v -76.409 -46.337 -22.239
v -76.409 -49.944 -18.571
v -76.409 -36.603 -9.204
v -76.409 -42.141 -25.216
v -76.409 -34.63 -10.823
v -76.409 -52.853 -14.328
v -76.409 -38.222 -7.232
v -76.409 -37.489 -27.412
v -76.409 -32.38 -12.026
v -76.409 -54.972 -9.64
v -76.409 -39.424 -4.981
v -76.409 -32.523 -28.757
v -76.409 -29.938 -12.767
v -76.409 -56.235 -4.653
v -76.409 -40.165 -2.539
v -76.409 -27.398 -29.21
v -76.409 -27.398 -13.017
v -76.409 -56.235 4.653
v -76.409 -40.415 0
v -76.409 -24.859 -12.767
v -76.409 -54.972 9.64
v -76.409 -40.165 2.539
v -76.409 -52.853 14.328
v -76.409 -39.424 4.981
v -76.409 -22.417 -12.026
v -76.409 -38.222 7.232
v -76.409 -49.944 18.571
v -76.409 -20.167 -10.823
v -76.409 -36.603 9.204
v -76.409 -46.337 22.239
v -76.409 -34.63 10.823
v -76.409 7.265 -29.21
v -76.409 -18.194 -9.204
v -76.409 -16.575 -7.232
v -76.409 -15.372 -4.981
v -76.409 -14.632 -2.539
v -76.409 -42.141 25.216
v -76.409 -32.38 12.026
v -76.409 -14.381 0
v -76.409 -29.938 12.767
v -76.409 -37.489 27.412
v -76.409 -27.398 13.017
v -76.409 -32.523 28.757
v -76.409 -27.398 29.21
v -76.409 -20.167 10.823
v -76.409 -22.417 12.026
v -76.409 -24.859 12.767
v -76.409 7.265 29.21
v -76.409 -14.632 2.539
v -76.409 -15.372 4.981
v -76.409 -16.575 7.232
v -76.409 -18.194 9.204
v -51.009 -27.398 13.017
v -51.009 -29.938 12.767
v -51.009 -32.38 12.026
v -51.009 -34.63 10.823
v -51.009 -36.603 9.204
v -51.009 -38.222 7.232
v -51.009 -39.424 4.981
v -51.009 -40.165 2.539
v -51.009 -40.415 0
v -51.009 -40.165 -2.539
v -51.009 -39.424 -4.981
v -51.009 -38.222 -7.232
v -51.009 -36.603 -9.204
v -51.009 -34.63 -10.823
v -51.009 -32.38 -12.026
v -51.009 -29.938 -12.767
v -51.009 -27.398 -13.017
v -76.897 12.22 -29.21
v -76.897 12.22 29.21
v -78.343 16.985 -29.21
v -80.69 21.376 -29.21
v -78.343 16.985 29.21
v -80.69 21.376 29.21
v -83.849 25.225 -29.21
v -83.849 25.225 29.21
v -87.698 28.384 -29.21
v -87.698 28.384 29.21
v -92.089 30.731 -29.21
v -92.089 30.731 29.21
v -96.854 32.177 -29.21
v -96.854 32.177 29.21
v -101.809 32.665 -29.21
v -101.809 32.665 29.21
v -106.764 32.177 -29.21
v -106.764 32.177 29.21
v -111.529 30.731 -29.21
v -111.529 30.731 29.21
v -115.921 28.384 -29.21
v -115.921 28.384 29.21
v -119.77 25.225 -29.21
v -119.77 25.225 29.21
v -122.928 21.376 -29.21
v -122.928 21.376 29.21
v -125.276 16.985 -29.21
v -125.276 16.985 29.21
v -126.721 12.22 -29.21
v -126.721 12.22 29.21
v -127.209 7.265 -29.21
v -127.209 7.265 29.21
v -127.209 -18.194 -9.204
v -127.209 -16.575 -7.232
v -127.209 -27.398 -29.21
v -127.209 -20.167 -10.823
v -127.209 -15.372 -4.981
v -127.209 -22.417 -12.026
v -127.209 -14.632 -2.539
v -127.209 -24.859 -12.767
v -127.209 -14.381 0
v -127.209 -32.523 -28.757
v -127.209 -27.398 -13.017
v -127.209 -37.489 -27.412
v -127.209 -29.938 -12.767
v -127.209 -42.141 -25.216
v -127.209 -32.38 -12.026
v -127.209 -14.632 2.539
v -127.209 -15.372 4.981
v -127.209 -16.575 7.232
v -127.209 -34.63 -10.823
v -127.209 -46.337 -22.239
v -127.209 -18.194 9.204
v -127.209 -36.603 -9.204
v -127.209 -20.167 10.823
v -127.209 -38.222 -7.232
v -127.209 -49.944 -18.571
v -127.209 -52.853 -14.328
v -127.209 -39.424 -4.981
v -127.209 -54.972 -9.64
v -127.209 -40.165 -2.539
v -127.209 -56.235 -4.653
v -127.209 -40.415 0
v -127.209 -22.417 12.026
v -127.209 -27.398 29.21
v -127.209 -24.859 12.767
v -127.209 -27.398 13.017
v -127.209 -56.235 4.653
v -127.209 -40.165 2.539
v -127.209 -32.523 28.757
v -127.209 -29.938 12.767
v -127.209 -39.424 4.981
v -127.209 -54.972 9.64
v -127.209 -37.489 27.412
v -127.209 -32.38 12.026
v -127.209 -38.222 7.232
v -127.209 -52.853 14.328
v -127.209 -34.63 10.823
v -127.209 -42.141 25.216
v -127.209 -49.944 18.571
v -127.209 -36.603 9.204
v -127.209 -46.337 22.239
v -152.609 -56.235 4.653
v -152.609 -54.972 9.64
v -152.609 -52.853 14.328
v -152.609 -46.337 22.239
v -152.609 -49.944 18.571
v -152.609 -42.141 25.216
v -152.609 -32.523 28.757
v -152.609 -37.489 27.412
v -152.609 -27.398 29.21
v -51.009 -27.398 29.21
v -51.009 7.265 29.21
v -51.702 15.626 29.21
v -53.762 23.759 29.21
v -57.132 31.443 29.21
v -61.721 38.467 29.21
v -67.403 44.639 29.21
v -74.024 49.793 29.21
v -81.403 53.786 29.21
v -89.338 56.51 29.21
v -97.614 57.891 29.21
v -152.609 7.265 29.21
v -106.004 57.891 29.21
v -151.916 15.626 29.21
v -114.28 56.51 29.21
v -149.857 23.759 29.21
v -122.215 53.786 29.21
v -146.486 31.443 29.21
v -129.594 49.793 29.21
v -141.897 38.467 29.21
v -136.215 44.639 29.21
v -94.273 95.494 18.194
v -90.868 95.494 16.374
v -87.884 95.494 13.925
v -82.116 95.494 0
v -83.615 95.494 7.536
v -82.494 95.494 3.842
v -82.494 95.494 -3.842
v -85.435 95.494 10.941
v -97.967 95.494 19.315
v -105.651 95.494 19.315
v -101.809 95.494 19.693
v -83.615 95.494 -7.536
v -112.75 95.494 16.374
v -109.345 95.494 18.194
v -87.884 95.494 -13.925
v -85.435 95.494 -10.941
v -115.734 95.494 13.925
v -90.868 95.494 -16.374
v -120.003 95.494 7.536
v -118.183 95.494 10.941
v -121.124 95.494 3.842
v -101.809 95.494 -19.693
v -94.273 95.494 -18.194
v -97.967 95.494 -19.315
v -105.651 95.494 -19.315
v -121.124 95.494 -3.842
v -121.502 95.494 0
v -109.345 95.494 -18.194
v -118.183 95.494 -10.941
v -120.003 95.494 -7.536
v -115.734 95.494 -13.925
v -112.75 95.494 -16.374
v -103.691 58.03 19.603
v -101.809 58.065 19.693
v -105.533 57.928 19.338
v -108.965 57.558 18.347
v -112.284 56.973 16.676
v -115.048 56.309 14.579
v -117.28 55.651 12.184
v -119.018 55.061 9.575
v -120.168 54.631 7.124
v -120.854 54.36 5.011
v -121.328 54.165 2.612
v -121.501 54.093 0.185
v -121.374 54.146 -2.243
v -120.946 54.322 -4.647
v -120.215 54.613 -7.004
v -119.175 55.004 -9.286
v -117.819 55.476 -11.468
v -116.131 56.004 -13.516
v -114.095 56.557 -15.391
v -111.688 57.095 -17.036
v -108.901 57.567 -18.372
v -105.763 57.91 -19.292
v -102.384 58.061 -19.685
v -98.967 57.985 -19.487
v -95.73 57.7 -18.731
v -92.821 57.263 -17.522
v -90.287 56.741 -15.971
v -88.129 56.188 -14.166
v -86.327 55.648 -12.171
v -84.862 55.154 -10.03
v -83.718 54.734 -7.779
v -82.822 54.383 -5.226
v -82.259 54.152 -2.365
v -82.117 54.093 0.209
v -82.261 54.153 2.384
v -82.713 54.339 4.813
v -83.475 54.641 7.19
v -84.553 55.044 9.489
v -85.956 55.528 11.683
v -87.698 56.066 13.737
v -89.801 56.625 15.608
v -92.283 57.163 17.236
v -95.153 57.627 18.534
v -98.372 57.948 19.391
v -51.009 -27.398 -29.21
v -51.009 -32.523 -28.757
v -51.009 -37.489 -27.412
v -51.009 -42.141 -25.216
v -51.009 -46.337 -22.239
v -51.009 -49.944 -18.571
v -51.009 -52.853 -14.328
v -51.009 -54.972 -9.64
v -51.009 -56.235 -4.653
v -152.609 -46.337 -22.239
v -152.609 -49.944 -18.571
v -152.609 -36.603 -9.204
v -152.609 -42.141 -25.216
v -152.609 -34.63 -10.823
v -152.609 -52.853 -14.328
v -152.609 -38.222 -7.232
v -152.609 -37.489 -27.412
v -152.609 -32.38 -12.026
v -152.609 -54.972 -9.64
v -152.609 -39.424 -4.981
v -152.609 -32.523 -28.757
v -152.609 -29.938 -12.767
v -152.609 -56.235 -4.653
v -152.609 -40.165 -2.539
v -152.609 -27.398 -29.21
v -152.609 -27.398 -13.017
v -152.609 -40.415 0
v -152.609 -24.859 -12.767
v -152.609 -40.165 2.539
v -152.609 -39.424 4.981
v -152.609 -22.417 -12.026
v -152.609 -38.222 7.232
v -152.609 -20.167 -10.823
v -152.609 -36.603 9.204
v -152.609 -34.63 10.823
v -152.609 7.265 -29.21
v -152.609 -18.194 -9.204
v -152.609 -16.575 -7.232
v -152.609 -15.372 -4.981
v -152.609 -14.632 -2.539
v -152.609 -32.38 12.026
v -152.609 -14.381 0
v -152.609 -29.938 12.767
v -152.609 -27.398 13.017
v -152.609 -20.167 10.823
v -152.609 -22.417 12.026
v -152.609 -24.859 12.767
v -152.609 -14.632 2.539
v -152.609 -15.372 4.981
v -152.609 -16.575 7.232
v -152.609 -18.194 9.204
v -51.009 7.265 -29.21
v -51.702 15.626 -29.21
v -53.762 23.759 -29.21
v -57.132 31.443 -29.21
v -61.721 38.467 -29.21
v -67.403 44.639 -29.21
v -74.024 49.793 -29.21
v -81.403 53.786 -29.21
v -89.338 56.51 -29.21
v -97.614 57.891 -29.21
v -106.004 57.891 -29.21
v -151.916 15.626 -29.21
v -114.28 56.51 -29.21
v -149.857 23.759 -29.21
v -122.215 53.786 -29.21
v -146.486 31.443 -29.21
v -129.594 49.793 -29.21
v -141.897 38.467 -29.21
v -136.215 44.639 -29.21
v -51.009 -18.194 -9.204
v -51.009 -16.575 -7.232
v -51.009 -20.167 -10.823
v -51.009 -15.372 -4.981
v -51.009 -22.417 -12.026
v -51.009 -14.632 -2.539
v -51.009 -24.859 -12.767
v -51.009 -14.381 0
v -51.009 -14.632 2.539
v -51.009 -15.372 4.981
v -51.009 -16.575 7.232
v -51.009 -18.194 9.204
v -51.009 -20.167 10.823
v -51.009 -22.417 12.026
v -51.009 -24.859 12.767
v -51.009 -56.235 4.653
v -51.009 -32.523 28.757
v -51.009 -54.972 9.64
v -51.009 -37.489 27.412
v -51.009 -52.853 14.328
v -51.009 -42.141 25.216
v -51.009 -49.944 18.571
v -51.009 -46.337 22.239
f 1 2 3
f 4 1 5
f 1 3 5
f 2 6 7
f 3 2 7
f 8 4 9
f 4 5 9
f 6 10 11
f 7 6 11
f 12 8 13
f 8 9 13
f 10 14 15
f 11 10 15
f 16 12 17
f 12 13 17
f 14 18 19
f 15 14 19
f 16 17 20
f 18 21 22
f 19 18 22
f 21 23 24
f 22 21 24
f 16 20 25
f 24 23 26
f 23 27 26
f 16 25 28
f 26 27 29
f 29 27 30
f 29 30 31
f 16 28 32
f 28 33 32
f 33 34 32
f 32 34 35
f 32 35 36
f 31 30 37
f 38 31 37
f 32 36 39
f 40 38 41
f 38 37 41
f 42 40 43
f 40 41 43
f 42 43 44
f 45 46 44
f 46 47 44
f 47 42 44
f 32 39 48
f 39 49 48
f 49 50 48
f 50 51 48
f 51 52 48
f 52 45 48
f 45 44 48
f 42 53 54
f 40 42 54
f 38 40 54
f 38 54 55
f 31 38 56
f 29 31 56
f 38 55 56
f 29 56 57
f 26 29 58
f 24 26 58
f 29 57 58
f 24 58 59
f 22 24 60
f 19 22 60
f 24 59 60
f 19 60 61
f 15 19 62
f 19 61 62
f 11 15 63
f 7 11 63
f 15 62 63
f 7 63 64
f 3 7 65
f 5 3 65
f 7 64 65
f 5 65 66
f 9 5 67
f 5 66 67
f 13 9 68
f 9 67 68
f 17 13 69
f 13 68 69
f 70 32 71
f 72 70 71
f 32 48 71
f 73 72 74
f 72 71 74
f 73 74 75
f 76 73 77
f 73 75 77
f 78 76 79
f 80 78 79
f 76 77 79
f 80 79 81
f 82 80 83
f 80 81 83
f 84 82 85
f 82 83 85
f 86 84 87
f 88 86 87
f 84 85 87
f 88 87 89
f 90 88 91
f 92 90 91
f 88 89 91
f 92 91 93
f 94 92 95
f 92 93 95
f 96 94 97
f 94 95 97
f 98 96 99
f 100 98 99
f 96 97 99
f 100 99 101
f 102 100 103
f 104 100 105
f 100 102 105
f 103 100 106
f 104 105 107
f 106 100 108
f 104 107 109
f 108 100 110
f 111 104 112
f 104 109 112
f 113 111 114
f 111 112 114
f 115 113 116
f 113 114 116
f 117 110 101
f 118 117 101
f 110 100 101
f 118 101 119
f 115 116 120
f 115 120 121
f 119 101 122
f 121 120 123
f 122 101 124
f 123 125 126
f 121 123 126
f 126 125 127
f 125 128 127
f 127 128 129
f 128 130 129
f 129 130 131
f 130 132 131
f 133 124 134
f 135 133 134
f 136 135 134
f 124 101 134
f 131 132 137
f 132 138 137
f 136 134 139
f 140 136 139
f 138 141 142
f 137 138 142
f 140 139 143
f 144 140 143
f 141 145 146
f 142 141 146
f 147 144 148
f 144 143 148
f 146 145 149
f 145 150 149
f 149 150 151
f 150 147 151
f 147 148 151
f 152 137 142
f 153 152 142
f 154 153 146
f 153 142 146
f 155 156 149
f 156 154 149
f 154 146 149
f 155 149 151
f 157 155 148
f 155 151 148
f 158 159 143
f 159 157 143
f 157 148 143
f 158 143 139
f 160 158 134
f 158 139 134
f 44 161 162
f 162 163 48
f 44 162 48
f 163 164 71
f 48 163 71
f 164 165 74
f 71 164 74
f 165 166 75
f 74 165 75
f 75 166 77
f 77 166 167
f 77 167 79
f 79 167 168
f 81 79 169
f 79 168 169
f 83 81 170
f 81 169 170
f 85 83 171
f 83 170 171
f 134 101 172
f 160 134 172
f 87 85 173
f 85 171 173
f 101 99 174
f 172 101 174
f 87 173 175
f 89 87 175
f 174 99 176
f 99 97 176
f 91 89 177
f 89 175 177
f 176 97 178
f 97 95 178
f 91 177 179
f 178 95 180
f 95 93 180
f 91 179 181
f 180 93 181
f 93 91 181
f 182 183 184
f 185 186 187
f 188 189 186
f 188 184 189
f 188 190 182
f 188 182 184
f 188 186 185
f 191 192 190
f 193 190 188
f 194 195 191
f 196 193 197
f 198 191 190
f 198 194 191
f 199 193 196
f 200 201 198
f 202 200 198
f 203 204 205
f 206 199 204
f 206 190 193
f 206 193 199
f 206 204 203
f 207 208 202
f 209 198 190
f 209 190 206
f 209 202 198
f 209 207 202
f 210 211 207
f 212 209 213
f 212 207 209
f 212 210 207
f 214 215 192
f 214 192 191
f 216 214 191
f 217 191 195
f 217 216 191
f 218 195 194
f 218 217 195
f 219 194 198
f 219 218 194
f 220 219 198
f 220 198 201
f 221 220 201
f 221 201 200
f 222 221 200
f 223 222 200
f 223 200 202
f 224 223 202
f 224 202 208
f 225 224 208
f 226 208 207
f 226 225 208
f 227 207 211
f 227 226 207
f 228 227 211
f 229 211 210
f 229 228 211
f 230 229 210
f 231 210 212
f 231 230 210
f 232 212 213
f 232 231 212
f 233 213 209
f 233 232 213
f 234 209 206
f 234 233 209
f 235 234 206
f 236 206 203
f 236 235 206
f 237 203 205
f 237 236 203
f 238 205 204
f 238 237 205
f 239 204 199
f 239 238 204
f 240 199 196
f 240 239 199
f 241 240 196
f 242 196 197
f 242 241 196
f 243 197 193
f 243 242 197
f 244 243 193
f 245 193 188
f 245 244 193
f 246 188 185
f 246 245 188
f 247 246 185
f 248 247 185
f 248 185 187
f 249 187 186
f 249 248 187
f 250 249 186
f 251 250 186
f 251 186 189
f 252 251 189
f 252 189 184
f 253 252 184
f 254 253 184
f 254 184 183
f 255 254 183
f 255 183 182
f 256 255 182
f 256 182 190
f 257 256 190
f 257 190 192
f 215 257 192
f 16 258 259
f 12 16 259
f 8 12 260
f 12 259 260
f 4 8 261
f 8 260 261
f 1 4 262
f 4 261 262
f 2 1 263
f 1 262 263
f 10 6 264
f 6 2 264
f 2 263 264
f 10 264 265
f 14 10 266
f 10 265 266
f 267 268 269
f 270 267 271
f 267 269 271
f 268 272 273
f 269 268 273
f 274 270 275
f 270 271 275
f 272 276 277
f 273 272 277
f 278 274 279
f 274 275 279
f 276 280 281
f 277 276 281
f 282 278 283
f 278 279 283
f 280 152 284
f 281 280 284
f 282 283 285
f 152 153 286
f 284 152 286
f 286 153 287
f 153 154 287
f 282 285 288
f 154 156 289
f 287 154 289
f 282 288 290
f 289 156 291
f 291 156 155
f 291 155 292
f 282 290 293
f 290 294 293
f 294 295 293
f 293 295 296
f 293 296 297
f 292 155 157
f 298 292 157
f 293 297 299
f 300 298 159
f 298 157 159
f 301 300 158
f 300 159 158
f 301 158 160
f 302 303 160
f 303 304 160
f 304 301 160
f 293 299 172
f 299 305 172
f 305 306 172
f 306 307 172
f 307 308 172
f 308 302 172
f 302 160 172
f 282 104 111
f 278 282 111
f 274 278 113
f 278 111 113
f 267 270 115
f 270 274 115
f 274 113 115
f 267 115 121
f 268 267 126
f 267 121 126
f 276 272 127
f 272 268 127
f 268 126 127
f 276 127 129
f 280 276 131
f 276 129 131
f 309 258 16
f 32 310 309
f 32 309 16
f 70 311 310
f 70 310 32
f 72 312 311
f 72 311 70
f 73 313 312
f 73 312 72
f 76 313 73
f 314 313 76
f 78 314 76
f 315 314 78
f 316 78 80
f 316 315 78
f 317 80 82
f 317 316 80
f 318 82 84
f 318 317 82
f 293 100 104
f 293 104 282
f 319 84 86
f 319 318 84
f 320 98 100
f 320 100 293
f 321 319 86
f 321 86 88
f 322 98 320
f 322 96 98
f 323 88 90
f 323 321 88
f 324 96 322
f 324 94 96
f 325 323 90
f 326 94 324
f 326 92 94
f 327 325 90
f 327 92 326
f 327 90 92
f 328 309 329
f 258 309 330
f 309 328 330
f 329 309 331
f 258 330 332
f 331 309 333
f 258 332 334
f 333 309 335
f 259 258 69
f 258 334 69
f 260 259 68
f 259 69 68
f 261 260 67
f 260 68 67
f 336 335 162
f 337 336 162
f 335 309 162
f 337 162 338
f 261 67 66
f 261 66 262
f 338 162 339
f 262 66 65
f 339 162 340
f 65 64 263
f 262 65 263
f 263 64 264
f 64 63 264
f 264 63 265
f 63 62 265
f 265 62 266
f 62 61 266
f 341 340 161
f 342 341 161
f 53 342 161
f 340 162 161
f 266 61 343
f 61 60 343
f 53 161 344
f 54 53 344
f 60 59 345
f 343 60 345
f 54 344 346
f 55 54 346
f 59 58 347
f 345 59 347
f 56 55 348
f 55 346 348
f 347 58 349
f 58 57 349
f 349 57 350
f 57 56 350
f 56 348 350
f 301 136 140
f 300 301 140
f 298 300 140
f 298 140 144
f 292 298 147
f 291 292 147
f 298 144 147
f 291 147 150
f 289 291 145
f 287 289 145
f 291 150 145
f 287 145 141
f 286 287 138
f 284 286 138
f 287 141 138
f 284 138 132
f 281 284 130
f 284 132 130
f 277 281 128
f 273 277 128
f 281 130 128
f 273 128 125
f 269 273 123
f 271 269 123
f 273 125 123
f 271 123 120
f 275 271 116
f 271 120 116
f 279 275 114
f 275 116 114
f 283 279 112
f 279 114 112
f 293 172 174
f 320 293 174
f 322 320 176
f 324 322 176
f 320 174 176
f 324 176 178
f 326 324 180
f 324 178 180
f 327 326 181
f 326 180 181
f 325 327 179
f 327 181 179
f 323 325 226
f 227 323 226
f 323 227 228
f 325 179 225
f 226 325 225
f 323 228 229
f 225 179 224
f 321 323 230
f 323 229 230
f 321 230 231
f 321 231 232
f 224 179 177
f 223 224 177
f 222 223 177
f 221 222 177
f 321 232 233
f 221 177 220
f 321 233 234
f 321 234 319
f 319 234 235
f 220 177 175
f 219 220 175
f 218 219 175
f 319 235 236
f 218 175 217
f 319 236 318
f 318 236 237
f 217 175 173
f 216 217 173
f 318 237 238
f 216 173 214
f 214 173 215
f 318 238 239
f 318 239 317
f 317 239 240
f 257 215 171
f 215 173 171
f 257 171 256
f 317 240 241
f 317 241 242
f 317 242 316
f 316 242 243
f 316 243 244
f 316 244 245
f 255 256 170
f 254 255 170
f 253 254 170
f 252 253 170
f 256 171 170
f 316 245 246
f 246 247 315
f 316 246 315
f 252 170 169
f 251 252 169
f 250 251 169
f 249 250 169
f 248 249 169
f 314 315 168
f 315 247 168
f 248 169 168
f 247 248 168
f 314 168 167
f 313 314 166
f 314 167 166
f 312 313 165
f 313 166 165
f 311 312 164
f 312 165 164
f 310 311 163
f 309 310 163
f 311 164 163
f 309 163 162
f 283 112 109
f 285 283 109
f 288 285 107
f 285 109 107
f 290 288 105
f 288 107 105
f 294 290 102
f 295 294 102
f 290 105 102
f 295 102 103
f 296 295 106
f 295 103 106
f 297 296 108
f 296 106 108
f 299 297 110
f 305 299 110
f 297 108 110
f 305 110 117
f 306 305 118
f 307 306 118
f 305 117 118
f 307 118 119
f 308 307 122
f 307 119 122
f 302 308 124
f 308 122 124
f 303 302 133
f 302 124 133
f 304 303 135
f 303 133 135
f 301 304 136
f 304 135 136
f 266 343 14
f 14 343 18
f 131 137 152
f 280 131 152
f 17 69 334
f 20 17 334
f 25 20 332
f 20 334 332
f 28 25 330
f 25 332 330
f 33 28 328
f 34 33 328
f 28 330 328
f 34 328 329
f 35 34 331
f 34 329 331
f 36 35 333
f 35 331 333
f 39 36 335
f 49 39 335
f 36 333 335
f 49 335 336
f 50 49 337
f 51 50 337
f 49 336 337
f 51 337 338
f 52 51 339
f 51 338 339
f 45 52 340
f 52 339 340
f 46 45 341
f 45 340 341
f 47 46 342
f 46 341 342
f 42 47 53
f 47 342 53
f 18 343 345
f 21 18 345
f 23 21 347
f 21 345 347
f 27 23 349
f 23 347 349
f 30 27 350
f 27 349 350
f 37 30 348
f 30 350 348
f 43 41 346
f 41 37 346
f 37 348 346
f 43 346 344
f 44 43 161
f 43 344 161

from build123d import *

# Parameters (mm, degrees)
BOSS_EXTRUDE1_DEPTH = 29.21
CUT_EXTRUDE1_DEPTH  = 143.460247374


with BuildPart() as part:
    # Sketch1 → Boss-Extrude1 (new, symmetric)
    with BuildSketch(Plane.XY):
        with BuildLine():
            ThreePointArc((-152.609053498, 7.264609053), (-101.809053498, 58.064609053), (-51.009053498, 7.264609053))
            Line((-51.009053498, 7.264609053), (-51.009053498, -56.235390947))
            Line((-51.009053498, -56.235390947), (-76.409053498, -56.235390947))
            Line((-76.409053498, -56.235390947), (-76.409053498, 7.264609053))
            ThreePointArc((-76.409053498, 7.264609053), (-101.809053498, 32.664609053), (-127.209053498, 7.264609053))
            Line((-127.209053498, 7.264609053), (-127.209053498, -56.235390947))
            Line((-127.209053498, -56.235390947), (-152.609053498, -56.235390947))
            Line((-152.609053498, -56.235390947), (-152.609053498, 7.264609053))
        make_face()
    extrude(amount=BOSS_EXTRUDE1_DEPTH, both=True)

    # Sketch1<4> → Revolve1 (revolve)
    with BuildSketch(Plane.XY, mode=Mode.PRIVATE) as revolve1_sk:
        with BuildLine():
            Line((-121.502148415, 95.494177501), (-121.502148415, 54.092186533))
            ThreePointArc((-121.502148415, 54.092186533), (-111.853929407, 57.061601613), (-101.809053498, 58.064609053))
            Line((-101.809053498, 58.064609053), (-101.809053498, 95.494177501))
            Line((-101.809053498, 95.494177501), (-121.502148415, 95.494177501))
        make_face()
    revolve(revolve1_sk.sketch.rotate(Axis((-101.809053498, 95.494177501, 0), (0, -1, 0)), 270), axis=Axis((-101.809053498, 95.494177501, 0), (0, -1, 0)))

    # Sketch3 → Cut-Extrude1 (cut, through all)
    with BuildSketch(Plane(origin=(-51.009053498, 0, 0), x_dir=(0, 0, -1), z_dir=(1, 0, 0))):
        with BuildLine():
            ThreePointArc((-13.016901543, -27.398347302), (0, -40.415248845), (13.016901543, -27.398347302))
            Line((13.016901543, -27.398347302), (-13.016901543, -27.398347302))
        make_face()
        with BuildLine():
            Line((-13.016901543, -27.398347302), (13.016901543, -27.398347302))
            ThreePointArc((13.016901543, -27.398347302), (0, -14.381445758), (-13.016901543, -27.398347302))
        make_face()
        with BuildLine():
            ThreePointArc((-4.652850075, -56.235390947), (-22.238860702, -46.336593647), (-29.21, -27.398347302))
            Line((-29.21, -27.398347302), (-29.21, -56.235390947))
            Line((-29.21, -56.235390947), (-4.652850075, -56.235390947))
        make_face()
        with BuildLine():
            Line((29.21, -56.235390947), (29.21, -27.398347302))
            ThreePointArc((29.21, -27.398347302), (22.238860702, -46.336593647), (4.652850075, -56.235390947))
            Line((4.652850075, -56.235390947), (29.21, -56.235390947))
        make_face()
    extrude(amount=-CUT_EXTRUDE1_DEPTH, mode=Mode.SUBTRACT)


solid = part.part
